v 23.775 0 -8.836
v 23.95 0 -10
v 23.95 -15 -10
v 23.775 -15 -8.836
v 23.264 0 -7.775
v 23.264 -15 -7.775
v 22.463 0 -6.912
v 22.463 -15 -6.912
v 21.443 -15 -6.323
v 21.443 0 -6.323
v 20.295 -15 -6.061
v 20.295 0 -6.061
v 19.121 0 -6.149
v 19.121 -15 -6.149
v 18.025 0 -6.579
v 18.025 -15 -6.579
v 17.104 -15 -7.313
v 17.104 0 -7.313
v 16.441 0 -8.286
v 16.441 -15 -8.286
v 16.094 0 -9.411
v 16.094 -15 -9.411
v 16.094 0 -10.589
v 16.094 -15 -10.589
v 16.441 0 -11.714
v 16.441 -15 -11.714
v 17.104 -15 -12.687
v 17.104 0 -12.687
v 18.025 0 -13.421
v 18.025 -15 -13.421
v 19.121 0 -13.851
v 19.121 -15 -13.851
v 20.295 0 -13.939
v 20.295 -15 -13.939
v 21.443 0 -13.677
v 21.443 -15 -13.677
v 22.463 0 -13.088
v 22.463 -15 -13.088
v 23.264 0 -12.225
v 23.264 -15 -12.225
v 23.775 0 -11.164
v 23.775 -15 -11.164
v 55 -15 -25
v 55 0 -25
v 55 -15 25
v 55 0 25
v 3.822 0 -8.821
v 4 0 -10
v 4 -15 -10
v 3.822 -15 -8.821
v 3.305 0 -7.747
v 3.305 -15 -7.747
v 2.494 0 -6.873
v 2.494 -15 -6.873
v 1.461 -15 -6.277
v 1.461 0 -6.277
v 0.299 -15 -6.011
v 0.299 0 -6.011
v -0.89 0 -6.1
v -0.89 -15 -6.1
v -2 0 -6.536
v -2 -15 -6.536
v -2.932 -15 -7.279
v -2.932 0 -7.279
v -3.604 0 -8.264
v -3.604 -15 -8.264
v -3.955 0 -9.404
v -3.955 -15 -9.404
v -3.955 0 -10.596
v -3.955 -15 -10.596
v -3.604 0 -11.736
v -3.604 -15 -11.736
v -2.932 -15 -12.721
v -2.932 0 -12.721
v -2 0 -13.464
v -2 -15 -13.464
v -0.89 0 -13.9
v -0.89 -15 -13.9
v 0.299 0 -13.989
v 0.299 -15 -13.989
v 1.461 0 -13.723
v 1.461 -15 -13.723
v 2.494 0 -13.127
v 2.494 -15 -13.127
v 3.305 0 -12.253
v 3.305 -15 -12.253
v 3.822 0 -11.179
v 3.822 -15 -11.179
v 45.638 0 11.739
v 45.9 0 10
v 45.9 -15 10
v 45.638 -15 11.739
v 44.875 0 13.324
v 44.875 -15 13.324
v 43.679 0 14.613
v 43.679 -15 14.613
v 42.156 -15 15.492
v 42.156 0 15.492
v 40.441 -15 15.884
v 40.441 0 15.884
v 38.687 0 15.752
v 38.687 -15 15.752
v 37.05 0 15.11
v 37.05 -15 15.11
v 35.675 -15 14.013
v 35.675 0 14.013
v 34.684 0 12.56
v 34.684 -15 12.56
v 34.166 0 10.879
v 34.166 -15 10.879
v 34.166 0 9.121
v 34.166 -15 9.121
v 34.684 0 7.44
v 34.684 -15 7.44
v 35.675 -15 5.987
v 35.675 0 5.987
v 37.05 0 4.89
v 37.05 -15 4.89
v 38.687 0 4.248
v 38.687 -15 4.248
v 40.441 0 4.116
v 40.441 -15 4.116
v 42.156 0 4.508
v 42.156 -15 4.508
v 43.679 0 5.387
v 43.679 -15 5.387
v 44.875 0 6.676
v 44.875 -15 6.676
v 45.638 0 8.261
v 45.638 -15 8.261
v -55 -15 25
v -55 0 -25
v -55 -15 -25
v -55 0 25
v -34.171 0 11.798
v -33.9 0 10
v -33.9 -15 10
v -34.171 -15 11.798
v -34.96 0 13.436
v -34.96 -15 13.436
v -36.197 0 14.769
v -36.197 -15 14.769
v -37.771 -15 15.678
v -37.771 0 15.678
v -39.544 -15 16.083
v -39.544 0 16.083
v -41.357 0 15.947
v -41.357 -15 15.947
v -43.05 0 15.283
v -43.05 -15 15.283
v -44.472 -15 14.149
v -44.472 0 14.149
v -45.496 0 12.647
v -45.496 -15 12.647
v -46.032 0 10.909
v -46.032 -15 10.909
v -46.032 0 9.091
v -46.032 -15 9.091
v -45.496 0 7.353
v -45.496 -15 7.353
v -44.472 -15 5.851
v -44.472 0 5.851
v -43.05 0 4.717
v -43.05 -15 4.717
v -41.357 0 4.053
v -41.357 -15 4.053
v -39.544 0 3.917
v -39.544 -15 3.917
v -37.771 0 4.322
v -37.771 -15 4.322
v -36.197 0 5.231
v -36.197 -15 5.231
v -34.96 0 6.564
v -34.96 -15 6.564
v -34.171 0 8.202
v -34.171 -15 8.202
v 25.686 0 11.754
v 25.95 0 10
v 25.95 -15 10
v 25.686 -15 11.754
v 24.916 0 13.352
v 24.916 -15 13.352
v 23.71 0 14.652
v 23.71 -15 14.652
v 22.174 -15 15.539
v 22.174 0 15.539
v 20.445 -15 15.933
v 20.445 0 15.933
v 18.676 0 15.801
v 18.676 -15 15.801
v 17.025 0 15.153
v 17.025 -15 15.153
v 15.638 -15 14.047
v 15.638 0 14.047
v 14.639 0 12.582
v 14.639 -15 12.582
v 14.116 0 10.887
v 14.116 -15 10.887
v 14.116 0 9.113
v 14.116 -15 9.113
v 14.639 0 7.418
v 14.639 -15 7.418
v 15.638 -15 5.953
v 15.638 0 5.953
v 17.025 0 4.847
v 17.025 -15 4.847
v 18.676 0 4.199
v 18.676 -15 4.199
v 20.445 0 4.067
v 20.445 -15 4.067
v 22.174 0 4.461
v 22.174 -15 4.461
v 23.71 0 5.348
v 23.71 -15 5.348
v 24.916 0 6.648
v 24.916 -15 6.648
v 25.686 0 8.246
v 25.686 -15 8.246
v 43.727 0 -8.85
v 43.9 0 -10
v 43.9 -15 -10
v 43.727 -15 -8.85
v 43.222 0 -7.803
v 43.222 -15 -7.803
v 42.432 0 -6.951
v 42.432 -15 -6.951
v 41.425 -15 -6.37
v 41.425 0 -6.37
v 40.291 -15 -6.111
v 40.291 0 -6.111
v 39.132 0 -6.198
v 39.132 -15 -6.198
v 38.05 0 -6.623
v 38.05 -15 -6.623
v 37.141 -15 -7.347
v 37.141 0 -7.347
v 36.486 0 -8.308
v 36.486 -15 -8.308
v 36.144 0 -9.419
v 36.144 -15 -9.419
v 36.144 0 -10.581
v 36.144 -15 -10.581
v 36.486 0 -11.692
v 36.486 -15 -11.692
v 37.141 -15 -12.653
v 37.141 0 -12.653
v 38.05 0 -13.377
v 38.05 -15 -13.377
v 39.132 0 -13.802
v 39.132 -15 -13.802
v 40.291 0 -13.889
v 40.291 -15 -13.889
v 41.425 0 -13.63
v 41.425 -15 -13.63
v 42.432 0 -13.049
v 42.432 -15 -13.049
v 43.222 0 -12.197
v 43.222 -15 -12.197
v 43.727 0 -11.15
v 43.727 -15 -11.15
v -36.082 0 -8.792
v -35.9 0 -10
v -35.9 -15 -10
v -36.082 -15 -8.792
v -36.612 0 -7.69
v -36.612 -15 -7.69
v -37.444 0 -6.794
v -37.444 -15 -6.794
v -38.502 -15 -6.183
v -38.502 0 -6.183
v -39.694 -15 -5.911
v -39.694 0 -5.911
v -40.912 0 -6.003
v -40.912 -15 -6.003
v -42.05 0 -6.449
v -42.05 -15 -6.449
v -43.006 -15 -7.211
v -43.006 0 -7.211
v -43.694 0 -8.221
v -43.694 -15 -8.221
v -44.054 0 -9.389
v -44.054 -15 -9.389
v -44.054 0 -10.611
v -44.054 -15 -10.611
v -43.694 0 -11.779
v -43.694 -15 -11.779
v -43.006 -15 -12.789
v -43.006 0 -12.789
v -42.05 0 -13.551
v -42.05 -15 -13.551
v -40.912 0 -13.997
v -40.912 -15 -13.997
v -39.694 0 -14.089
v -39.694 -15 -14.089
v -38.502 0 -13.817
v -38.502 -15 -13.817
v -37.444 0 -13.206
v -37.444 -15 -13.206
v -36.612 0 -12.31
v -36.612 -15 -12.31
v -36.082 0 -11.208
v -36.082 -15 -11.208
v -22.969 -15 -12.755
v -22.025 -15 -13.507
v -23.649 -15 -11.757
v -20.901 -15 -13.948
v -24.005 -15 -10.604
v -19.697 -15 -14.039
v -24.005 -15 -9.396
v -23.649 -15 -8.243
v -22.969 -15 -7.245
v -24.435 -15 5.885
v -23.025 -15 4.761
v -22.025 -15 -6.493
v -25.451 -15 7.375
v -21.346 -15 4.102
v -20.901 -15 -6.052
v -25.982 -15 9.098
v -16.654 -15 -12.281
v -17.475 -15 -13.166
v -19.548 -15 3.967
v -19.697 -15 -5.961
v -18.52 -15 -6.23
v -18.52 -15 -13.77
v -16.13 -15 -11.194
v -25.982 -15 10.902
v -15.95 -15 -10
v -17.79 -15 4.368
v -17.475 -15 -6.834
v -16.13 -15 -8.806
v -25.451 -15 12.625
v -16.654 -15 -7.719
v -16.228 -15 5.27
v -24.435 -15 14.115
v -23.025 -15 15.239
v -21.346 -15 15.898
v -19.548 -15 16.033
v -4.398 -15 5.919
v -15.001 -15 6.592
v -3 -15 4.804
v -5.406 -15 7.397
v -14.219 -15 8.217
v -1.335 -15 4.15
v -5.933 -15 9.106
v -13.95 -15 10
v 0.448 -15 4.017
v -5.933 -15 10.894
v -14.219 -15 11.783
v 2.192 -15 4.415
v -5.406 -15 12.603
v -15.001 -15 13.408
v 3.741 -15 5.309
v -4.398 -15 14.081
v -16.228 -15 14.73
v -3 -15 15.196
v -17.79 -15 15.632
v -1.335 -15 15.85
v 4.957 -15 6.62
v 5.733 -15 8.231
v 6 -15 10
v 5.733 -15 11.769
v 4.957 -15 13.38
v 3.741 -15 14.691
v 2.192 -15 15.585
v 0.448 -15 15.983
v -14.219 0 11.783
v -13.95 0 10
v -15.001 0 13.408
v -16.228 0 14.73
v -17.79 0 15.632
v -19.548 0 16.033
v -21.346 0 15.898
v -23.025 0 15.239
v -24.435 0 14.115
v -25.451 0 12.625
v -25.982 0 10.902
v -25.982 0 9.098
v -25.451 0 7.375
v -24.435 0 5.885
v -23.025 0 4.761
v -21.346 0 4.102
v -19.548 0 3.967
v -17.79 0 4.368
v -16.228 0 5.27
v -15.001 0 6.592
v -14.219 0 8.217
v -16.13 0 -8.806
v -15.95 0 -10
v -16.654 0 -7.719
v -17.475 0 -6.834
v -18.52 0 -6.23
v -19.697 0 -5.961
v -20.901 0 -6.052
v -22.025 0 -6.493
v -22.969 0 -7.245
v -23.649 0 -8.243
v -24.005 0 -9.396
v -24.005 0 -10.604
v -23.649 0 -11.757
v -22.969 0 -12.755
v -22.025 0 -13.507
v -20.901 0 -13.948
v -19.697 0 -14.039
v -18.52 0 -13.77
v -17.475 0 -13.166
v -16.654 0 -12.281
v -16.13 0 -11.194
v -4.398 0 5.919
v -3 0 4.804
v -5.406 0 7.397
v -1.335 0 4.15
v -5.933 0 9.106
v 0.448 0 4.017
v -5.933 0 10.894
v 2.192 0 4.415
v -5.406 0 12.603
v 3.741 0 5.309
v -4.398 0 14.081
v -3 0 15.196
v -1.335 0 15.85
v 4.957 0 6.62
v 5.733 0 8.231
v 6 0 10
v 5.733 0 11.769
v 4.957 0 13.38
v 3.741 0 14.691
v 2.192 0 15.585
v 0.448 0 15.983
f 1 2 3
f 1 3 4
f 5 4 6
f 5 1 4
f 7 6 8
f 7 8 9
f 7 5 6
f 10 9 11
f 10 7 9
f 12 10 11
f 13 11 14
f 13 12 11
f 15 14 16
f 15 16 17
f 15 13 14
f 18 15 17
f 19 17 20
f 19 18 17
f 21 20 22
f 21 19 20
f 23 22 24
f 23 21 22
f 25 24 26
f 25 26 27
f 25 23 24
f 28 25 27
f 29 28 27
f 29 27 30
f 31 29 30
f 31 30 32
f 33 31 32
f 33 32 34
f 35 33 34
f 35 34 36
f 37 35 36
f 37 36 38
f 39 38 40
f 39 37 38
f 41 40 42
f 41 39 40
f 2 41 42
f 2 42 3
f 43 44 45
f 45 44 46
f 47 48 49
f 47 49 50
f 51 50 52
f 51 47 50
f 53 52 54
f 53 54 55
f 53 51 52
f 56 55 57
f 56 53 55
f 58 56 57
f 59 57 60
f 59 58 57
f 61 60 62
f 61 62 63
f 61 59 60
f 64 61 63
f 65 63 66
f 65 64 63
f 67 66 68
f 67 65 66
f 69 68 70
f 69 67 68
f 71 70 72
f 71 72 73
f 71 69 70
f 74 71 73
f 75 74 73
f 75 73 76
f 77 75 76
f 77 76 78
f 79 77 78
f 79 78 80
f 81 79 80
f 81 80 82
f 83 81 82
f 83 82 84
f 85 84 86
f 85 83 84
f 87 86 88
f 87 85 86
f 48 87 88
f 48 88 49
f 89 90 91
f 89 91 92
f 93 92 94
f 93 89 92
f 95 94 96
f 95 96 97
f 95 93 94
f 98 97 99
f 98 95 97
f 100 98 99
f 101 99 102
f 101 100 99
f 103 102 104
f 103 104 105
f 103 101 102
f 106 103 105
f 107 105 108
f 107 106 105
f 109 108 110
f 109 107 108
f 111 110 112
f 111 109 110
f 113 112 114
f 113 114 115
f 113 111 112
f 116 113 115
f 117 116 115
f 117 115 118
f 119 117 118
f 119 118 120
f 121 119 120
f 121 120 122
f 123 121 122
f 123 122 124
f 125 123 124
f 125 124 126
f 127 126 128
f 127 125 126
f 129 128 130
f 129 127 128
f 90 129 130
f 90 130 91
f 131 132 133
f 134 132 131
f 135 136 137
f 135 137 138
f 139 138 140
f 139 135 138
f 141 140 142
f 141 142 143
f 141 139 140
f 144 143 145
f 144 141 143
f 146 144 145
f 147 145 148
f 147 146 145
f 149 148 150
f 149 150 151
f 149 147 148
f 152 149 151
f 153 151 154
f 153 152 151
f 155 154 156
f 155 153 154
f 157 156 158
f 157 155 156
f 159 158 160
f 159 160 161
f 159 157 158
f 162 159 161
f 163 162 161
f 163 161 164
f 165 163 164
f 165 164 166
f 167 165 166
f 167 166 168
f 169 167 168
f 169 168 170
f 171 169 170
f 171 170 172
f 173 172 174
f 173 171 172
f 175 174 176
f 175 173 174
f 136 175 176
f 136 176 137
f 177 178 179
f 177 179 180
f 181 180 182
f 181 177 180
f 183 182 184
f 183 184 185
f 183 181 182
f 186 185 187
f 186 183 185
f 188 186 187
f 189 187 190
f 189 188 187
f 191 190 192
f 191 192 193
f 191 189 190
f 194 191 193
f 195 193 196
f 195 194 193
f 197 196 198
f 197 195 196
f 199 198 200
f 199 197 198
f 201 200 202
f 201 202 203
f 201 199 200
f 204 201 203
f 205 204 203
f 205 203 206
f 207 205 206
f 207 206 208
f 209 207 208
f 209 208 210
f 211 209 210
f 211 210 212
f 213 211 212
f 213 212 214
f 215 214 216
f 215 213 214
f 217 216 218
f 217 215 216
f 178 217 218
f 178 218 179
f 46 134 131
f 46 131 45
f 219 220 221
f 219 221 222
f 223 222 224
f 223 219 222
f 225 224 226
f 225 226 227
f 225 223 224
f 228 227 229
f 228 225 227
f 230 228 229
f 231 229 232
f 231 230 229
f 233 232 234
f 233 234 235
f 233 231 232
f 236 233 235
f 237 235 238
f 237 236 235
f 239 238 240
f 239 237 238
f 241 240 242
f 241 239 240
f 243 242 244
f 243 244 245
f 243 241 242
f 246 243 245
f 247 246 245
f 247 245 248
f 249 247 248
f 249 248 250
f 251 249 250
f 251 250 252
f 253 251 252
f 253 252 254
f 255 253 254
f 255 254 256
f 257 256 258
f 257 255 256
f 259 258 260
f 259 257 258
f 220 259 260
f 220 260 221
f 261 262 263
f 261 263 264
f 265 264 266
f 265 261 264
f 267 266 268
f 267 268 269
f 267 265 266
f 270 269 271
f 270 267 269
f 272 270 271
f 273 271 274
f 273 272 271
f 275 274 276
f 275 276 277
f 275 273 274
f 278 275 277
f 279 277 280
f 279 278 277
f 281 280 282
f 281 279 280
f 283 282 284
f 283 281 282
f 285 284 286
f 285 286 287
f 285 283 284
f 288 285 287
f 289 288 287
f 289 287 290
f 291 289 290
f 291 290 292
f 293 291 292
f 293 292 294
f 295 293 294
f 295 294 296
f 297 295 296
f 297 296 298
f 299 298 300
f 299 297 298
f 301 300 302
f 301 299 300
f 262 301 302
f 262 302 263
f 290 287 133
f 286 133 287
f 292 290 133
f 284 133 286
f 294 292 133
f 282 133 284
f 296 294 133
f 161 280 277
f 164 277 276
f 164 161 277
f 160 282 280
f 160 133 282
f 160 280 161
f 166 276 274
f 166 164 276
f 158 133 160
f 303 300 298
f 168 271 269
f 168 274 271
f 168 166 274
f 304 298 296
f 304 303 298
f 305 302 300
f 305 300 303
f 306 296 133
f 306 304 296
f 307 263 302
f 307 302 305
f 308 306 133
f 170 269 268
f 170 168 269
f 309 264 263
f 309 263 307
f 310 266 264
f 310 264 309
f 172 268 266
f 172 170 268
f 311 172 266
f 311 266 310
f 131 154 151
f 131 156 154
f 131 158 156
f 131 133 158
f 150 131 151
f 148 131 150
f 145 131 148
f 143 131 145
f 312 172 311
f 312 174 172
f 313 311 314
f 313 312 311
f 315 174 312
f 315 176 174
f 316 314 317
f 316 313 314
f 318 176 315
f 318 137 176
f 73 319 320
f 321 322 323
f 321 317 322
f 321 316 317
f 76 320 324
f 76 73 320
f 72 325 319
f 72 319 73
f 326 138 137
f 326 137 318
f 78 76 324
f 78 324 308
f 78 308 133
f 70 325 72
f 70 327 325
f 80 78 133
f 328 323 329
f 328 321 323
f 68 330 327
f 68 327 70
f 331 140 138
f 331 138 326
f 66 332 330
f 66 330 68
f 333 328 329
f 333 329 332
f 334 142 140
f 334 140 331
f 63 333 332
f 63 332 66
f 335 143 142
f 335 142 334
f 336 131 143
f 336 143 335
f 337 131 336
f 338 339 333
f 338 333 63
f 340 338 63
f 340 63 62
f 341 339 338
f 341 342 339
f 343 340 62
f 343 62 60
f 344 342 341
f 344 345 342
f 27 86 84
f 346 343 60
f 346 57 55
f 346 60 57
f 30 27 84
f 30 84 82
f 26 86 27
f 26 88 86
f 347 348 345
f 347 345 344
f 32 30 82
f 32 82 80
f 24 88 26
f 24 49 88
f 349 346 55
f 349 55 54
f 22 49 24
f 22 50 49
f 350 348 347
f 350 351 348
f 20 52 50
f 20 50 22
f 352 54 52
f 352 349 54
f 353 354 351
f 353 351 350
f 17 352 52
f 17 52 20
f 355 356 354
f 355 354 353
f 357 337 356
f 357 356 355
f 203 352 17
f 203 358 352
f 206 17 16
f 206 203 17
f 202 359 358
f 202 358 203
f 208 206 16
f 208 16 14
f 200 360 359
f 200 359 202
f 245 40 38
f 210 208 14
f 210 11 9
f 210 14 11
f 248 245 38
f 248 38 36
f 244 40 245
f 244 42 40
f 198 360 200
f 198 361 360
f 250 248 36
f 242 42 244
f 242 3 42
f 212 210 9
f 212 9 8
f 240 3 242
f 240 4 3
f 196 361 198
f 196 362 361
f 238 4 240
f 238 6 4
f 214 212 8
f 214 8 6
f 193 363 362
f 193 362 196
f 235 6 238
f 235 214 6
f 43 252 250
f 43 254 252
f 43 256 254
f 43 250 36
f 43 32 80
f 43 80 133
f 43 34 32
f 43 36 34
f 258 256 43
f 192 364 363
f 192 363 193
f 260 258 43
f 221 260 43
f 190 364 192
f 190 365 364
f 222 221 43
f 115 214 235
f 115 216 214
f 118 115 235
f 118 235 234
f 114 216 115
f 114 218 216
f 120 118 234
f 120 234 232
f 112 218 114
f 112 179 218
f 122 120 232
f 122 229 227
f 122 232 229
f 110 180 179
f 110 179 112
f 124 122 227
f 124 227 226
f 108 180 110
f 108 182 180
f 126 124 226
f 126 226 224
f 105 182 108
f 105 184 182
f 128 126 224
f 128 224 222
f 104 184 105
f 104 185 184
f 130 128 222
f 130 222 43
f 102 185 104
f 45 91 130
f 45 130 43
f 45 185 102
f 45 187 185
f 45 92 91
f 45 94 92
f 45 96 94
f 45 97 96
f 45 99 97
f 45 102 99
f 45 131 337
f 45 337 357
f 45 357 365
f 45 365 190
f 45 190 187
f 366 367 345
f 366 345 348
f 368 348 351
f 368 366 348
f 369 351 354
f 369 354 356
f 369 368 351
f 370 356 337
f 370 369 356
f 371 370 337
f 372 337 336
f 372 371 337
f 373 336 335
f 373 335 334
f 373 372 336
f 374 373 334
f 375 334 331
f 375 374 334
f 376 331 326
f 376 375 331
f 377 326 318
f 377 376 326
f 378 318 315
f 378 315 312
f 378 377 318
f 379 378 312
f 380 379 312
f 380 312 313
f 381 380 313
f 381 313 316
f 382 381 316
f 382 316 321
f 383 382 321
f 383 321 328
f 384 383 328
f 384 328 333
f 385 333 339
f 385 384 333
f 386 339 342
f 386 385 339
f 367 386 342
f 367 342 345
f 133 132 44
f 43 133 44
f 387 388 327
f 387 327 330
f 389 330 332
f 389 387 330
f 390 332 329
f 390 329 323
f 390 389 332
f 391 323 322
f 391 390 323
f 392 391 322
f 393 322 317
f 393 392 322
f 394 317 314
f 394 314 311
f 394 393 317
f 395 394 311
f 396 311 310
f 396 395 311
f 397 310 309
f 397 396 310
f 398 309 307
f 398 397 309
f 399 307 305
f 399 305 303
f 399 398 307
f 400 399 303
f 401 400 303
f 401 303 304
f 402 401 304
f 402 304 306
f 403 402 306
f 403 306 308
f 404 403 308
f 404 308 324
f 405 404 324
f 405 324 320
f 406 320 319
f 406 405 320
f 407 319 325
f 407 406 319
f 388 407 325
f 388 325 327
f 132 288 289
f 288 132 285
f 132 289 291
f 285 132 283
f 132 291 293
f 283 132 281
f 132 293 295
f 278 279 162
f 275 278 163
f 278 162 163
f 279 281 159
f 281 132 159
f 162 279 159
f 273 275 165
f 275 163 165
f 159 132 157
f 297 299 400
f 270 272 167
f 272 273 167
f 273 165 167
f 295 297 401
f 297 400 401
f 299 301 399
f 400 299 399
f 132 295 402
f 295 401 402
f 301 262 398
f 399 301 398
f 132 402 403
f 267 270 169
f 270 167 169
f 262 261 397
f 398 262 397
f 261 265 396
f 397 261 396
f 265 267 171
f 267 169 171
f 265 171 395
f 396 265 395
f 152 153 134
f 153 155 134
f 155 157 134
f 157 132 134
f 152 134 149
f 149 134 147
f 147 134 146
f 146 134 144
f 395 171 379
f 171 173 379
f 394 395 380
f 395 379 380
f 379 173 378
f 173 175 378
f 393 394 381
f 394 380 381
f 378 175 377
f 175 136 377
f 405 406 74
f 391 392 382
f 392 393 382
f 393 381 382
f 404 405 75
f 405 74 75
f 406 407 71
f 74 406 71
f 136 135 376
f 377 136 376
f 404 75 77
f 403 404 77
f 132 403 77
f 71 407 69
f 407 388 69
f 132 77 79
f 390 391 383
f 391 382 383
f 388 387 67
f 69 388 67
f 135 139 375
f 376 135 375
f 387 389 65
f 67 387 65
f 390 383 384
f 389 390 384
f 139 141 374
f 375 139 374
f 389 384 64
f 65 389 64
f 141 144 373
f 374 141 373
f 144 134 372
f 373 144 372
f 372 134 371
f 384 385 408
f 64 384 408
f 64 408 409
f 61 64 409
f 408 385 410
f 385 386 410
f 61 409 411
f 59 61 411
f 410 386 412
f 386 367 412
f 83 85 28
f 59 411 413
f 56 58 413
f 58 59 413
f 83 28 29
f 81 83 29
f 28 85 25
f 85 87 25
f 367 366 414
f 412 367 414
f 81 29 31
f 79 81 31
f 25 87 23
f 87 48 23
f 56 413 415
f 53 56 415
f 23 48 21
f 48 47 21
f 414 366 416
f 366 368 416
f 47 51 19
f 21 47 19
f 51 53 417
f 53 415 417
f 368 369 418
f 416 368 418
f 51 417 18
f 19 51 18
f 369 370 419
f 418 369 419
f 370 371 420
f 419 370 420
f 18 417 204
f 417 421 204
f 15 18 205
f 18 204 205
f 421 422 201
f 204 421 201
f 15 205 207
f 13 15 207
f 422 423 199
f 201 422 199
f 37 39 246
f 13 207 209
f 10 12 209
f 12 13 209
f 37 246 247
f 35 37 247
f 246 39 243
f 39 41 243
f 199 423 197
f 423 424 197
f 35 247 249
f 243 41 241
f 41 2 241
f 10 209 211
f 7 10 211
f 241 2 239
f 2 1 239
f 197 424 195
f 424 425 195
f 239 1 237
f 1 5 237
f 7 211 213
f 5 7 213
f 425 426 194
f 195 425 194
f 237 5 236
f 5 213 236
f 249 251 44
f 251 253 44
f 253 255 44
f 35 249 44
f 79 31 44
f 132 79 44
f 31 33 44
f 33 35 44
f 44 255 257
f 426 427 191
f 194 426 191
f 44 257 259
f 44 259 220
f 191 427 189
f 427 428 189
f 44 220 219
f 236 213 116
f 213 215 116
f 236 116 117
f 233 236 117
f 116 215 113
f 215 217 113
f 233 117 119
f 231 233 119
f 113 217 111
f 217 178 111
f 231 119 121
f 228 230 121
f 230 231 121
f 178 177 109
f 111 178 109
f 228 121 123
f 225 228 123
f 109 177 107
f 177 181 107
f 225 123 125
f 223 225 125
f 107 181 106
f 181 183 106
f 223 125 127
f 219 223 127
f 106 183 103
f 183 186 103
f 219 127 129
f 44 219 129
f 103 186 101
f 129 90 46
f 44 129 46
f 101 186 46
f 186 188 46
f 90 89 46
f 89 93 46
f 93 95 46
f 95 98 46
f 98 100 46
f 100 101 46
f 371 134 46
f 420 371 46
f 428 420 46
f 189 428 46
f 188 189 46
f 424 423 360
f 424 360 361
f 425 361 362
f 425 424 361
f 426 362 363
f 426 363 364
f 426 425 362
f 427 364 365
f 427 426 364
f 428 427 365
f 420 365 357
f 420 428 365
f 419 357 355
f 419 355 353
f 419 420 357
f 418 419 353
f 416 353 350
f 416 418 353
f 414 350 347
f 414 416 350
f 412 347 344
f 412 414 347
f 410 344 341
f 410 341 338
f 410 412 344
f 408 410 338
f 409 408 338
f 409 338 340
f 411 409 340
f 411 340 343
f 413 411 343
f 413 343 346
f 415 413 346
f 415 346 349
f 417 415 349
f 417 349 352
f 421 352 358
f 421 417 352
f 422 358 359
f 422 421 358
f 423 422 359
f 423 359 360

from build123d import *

# Parameters (mm, degrees)
F0_W     = 110
F0_H     = 50
F0_R     = 4.1
F0_R_2   = 4.05
F0_R_3   = 4
F0_R_4   = 3.95
F0_R_5   = 3.9
F0_R_6   = 6.1
F0_R_7   = 6.05
F0_R_8   = 6
F0_R_9   = 5.95
F0_R_10  = 5.9
F1_DEPTH = 15


with BuildPart() as f1:
    # F0 (on Front) → F1 (new body)
    with BuildSketch(Plane.XZ):
        Rectangle(F0_W, F0_H)
        with Locations((-40, -10)):
            Circle(F0_R, mode=Mode.SUBTRACT)
        with Locations((-20, -10)):
            Circle(F0_R_2, mode=Mode.SUBTRACT)
        with Locations((0, -10)):
            Circle(F0_R_3, mode=Mode.SUBTRACT)
        with Locations((20, -10)):
            Circle(F0_R_4, mode=Mode.SUBTRACT)
        with Locations((40, -10)):
            Circle(F0_R_5, mode=Mode.SUBTRACT)
        with Locations((-40, 10)):
            Circle(F0_R_6, mode=Mode.SUBTRACT)
        with Locations((-20, 10)):
            Circle(F0_R_7, mode=Mode.SUBTRACT)
        with Locations((0, 10)):
            Circle(F0_R_8, mode=Mode.SUBTRACT)
        with Locations((20, 10)):
            Circle(F0_R_9, mode=Mode.SUBTRACT)
        with Locations((40, 10)):
            Circle(F0_R_10, mode=Mode.SUBTRACT)
    extrude(amount=F1_DEPTH)


solid = f1.part
